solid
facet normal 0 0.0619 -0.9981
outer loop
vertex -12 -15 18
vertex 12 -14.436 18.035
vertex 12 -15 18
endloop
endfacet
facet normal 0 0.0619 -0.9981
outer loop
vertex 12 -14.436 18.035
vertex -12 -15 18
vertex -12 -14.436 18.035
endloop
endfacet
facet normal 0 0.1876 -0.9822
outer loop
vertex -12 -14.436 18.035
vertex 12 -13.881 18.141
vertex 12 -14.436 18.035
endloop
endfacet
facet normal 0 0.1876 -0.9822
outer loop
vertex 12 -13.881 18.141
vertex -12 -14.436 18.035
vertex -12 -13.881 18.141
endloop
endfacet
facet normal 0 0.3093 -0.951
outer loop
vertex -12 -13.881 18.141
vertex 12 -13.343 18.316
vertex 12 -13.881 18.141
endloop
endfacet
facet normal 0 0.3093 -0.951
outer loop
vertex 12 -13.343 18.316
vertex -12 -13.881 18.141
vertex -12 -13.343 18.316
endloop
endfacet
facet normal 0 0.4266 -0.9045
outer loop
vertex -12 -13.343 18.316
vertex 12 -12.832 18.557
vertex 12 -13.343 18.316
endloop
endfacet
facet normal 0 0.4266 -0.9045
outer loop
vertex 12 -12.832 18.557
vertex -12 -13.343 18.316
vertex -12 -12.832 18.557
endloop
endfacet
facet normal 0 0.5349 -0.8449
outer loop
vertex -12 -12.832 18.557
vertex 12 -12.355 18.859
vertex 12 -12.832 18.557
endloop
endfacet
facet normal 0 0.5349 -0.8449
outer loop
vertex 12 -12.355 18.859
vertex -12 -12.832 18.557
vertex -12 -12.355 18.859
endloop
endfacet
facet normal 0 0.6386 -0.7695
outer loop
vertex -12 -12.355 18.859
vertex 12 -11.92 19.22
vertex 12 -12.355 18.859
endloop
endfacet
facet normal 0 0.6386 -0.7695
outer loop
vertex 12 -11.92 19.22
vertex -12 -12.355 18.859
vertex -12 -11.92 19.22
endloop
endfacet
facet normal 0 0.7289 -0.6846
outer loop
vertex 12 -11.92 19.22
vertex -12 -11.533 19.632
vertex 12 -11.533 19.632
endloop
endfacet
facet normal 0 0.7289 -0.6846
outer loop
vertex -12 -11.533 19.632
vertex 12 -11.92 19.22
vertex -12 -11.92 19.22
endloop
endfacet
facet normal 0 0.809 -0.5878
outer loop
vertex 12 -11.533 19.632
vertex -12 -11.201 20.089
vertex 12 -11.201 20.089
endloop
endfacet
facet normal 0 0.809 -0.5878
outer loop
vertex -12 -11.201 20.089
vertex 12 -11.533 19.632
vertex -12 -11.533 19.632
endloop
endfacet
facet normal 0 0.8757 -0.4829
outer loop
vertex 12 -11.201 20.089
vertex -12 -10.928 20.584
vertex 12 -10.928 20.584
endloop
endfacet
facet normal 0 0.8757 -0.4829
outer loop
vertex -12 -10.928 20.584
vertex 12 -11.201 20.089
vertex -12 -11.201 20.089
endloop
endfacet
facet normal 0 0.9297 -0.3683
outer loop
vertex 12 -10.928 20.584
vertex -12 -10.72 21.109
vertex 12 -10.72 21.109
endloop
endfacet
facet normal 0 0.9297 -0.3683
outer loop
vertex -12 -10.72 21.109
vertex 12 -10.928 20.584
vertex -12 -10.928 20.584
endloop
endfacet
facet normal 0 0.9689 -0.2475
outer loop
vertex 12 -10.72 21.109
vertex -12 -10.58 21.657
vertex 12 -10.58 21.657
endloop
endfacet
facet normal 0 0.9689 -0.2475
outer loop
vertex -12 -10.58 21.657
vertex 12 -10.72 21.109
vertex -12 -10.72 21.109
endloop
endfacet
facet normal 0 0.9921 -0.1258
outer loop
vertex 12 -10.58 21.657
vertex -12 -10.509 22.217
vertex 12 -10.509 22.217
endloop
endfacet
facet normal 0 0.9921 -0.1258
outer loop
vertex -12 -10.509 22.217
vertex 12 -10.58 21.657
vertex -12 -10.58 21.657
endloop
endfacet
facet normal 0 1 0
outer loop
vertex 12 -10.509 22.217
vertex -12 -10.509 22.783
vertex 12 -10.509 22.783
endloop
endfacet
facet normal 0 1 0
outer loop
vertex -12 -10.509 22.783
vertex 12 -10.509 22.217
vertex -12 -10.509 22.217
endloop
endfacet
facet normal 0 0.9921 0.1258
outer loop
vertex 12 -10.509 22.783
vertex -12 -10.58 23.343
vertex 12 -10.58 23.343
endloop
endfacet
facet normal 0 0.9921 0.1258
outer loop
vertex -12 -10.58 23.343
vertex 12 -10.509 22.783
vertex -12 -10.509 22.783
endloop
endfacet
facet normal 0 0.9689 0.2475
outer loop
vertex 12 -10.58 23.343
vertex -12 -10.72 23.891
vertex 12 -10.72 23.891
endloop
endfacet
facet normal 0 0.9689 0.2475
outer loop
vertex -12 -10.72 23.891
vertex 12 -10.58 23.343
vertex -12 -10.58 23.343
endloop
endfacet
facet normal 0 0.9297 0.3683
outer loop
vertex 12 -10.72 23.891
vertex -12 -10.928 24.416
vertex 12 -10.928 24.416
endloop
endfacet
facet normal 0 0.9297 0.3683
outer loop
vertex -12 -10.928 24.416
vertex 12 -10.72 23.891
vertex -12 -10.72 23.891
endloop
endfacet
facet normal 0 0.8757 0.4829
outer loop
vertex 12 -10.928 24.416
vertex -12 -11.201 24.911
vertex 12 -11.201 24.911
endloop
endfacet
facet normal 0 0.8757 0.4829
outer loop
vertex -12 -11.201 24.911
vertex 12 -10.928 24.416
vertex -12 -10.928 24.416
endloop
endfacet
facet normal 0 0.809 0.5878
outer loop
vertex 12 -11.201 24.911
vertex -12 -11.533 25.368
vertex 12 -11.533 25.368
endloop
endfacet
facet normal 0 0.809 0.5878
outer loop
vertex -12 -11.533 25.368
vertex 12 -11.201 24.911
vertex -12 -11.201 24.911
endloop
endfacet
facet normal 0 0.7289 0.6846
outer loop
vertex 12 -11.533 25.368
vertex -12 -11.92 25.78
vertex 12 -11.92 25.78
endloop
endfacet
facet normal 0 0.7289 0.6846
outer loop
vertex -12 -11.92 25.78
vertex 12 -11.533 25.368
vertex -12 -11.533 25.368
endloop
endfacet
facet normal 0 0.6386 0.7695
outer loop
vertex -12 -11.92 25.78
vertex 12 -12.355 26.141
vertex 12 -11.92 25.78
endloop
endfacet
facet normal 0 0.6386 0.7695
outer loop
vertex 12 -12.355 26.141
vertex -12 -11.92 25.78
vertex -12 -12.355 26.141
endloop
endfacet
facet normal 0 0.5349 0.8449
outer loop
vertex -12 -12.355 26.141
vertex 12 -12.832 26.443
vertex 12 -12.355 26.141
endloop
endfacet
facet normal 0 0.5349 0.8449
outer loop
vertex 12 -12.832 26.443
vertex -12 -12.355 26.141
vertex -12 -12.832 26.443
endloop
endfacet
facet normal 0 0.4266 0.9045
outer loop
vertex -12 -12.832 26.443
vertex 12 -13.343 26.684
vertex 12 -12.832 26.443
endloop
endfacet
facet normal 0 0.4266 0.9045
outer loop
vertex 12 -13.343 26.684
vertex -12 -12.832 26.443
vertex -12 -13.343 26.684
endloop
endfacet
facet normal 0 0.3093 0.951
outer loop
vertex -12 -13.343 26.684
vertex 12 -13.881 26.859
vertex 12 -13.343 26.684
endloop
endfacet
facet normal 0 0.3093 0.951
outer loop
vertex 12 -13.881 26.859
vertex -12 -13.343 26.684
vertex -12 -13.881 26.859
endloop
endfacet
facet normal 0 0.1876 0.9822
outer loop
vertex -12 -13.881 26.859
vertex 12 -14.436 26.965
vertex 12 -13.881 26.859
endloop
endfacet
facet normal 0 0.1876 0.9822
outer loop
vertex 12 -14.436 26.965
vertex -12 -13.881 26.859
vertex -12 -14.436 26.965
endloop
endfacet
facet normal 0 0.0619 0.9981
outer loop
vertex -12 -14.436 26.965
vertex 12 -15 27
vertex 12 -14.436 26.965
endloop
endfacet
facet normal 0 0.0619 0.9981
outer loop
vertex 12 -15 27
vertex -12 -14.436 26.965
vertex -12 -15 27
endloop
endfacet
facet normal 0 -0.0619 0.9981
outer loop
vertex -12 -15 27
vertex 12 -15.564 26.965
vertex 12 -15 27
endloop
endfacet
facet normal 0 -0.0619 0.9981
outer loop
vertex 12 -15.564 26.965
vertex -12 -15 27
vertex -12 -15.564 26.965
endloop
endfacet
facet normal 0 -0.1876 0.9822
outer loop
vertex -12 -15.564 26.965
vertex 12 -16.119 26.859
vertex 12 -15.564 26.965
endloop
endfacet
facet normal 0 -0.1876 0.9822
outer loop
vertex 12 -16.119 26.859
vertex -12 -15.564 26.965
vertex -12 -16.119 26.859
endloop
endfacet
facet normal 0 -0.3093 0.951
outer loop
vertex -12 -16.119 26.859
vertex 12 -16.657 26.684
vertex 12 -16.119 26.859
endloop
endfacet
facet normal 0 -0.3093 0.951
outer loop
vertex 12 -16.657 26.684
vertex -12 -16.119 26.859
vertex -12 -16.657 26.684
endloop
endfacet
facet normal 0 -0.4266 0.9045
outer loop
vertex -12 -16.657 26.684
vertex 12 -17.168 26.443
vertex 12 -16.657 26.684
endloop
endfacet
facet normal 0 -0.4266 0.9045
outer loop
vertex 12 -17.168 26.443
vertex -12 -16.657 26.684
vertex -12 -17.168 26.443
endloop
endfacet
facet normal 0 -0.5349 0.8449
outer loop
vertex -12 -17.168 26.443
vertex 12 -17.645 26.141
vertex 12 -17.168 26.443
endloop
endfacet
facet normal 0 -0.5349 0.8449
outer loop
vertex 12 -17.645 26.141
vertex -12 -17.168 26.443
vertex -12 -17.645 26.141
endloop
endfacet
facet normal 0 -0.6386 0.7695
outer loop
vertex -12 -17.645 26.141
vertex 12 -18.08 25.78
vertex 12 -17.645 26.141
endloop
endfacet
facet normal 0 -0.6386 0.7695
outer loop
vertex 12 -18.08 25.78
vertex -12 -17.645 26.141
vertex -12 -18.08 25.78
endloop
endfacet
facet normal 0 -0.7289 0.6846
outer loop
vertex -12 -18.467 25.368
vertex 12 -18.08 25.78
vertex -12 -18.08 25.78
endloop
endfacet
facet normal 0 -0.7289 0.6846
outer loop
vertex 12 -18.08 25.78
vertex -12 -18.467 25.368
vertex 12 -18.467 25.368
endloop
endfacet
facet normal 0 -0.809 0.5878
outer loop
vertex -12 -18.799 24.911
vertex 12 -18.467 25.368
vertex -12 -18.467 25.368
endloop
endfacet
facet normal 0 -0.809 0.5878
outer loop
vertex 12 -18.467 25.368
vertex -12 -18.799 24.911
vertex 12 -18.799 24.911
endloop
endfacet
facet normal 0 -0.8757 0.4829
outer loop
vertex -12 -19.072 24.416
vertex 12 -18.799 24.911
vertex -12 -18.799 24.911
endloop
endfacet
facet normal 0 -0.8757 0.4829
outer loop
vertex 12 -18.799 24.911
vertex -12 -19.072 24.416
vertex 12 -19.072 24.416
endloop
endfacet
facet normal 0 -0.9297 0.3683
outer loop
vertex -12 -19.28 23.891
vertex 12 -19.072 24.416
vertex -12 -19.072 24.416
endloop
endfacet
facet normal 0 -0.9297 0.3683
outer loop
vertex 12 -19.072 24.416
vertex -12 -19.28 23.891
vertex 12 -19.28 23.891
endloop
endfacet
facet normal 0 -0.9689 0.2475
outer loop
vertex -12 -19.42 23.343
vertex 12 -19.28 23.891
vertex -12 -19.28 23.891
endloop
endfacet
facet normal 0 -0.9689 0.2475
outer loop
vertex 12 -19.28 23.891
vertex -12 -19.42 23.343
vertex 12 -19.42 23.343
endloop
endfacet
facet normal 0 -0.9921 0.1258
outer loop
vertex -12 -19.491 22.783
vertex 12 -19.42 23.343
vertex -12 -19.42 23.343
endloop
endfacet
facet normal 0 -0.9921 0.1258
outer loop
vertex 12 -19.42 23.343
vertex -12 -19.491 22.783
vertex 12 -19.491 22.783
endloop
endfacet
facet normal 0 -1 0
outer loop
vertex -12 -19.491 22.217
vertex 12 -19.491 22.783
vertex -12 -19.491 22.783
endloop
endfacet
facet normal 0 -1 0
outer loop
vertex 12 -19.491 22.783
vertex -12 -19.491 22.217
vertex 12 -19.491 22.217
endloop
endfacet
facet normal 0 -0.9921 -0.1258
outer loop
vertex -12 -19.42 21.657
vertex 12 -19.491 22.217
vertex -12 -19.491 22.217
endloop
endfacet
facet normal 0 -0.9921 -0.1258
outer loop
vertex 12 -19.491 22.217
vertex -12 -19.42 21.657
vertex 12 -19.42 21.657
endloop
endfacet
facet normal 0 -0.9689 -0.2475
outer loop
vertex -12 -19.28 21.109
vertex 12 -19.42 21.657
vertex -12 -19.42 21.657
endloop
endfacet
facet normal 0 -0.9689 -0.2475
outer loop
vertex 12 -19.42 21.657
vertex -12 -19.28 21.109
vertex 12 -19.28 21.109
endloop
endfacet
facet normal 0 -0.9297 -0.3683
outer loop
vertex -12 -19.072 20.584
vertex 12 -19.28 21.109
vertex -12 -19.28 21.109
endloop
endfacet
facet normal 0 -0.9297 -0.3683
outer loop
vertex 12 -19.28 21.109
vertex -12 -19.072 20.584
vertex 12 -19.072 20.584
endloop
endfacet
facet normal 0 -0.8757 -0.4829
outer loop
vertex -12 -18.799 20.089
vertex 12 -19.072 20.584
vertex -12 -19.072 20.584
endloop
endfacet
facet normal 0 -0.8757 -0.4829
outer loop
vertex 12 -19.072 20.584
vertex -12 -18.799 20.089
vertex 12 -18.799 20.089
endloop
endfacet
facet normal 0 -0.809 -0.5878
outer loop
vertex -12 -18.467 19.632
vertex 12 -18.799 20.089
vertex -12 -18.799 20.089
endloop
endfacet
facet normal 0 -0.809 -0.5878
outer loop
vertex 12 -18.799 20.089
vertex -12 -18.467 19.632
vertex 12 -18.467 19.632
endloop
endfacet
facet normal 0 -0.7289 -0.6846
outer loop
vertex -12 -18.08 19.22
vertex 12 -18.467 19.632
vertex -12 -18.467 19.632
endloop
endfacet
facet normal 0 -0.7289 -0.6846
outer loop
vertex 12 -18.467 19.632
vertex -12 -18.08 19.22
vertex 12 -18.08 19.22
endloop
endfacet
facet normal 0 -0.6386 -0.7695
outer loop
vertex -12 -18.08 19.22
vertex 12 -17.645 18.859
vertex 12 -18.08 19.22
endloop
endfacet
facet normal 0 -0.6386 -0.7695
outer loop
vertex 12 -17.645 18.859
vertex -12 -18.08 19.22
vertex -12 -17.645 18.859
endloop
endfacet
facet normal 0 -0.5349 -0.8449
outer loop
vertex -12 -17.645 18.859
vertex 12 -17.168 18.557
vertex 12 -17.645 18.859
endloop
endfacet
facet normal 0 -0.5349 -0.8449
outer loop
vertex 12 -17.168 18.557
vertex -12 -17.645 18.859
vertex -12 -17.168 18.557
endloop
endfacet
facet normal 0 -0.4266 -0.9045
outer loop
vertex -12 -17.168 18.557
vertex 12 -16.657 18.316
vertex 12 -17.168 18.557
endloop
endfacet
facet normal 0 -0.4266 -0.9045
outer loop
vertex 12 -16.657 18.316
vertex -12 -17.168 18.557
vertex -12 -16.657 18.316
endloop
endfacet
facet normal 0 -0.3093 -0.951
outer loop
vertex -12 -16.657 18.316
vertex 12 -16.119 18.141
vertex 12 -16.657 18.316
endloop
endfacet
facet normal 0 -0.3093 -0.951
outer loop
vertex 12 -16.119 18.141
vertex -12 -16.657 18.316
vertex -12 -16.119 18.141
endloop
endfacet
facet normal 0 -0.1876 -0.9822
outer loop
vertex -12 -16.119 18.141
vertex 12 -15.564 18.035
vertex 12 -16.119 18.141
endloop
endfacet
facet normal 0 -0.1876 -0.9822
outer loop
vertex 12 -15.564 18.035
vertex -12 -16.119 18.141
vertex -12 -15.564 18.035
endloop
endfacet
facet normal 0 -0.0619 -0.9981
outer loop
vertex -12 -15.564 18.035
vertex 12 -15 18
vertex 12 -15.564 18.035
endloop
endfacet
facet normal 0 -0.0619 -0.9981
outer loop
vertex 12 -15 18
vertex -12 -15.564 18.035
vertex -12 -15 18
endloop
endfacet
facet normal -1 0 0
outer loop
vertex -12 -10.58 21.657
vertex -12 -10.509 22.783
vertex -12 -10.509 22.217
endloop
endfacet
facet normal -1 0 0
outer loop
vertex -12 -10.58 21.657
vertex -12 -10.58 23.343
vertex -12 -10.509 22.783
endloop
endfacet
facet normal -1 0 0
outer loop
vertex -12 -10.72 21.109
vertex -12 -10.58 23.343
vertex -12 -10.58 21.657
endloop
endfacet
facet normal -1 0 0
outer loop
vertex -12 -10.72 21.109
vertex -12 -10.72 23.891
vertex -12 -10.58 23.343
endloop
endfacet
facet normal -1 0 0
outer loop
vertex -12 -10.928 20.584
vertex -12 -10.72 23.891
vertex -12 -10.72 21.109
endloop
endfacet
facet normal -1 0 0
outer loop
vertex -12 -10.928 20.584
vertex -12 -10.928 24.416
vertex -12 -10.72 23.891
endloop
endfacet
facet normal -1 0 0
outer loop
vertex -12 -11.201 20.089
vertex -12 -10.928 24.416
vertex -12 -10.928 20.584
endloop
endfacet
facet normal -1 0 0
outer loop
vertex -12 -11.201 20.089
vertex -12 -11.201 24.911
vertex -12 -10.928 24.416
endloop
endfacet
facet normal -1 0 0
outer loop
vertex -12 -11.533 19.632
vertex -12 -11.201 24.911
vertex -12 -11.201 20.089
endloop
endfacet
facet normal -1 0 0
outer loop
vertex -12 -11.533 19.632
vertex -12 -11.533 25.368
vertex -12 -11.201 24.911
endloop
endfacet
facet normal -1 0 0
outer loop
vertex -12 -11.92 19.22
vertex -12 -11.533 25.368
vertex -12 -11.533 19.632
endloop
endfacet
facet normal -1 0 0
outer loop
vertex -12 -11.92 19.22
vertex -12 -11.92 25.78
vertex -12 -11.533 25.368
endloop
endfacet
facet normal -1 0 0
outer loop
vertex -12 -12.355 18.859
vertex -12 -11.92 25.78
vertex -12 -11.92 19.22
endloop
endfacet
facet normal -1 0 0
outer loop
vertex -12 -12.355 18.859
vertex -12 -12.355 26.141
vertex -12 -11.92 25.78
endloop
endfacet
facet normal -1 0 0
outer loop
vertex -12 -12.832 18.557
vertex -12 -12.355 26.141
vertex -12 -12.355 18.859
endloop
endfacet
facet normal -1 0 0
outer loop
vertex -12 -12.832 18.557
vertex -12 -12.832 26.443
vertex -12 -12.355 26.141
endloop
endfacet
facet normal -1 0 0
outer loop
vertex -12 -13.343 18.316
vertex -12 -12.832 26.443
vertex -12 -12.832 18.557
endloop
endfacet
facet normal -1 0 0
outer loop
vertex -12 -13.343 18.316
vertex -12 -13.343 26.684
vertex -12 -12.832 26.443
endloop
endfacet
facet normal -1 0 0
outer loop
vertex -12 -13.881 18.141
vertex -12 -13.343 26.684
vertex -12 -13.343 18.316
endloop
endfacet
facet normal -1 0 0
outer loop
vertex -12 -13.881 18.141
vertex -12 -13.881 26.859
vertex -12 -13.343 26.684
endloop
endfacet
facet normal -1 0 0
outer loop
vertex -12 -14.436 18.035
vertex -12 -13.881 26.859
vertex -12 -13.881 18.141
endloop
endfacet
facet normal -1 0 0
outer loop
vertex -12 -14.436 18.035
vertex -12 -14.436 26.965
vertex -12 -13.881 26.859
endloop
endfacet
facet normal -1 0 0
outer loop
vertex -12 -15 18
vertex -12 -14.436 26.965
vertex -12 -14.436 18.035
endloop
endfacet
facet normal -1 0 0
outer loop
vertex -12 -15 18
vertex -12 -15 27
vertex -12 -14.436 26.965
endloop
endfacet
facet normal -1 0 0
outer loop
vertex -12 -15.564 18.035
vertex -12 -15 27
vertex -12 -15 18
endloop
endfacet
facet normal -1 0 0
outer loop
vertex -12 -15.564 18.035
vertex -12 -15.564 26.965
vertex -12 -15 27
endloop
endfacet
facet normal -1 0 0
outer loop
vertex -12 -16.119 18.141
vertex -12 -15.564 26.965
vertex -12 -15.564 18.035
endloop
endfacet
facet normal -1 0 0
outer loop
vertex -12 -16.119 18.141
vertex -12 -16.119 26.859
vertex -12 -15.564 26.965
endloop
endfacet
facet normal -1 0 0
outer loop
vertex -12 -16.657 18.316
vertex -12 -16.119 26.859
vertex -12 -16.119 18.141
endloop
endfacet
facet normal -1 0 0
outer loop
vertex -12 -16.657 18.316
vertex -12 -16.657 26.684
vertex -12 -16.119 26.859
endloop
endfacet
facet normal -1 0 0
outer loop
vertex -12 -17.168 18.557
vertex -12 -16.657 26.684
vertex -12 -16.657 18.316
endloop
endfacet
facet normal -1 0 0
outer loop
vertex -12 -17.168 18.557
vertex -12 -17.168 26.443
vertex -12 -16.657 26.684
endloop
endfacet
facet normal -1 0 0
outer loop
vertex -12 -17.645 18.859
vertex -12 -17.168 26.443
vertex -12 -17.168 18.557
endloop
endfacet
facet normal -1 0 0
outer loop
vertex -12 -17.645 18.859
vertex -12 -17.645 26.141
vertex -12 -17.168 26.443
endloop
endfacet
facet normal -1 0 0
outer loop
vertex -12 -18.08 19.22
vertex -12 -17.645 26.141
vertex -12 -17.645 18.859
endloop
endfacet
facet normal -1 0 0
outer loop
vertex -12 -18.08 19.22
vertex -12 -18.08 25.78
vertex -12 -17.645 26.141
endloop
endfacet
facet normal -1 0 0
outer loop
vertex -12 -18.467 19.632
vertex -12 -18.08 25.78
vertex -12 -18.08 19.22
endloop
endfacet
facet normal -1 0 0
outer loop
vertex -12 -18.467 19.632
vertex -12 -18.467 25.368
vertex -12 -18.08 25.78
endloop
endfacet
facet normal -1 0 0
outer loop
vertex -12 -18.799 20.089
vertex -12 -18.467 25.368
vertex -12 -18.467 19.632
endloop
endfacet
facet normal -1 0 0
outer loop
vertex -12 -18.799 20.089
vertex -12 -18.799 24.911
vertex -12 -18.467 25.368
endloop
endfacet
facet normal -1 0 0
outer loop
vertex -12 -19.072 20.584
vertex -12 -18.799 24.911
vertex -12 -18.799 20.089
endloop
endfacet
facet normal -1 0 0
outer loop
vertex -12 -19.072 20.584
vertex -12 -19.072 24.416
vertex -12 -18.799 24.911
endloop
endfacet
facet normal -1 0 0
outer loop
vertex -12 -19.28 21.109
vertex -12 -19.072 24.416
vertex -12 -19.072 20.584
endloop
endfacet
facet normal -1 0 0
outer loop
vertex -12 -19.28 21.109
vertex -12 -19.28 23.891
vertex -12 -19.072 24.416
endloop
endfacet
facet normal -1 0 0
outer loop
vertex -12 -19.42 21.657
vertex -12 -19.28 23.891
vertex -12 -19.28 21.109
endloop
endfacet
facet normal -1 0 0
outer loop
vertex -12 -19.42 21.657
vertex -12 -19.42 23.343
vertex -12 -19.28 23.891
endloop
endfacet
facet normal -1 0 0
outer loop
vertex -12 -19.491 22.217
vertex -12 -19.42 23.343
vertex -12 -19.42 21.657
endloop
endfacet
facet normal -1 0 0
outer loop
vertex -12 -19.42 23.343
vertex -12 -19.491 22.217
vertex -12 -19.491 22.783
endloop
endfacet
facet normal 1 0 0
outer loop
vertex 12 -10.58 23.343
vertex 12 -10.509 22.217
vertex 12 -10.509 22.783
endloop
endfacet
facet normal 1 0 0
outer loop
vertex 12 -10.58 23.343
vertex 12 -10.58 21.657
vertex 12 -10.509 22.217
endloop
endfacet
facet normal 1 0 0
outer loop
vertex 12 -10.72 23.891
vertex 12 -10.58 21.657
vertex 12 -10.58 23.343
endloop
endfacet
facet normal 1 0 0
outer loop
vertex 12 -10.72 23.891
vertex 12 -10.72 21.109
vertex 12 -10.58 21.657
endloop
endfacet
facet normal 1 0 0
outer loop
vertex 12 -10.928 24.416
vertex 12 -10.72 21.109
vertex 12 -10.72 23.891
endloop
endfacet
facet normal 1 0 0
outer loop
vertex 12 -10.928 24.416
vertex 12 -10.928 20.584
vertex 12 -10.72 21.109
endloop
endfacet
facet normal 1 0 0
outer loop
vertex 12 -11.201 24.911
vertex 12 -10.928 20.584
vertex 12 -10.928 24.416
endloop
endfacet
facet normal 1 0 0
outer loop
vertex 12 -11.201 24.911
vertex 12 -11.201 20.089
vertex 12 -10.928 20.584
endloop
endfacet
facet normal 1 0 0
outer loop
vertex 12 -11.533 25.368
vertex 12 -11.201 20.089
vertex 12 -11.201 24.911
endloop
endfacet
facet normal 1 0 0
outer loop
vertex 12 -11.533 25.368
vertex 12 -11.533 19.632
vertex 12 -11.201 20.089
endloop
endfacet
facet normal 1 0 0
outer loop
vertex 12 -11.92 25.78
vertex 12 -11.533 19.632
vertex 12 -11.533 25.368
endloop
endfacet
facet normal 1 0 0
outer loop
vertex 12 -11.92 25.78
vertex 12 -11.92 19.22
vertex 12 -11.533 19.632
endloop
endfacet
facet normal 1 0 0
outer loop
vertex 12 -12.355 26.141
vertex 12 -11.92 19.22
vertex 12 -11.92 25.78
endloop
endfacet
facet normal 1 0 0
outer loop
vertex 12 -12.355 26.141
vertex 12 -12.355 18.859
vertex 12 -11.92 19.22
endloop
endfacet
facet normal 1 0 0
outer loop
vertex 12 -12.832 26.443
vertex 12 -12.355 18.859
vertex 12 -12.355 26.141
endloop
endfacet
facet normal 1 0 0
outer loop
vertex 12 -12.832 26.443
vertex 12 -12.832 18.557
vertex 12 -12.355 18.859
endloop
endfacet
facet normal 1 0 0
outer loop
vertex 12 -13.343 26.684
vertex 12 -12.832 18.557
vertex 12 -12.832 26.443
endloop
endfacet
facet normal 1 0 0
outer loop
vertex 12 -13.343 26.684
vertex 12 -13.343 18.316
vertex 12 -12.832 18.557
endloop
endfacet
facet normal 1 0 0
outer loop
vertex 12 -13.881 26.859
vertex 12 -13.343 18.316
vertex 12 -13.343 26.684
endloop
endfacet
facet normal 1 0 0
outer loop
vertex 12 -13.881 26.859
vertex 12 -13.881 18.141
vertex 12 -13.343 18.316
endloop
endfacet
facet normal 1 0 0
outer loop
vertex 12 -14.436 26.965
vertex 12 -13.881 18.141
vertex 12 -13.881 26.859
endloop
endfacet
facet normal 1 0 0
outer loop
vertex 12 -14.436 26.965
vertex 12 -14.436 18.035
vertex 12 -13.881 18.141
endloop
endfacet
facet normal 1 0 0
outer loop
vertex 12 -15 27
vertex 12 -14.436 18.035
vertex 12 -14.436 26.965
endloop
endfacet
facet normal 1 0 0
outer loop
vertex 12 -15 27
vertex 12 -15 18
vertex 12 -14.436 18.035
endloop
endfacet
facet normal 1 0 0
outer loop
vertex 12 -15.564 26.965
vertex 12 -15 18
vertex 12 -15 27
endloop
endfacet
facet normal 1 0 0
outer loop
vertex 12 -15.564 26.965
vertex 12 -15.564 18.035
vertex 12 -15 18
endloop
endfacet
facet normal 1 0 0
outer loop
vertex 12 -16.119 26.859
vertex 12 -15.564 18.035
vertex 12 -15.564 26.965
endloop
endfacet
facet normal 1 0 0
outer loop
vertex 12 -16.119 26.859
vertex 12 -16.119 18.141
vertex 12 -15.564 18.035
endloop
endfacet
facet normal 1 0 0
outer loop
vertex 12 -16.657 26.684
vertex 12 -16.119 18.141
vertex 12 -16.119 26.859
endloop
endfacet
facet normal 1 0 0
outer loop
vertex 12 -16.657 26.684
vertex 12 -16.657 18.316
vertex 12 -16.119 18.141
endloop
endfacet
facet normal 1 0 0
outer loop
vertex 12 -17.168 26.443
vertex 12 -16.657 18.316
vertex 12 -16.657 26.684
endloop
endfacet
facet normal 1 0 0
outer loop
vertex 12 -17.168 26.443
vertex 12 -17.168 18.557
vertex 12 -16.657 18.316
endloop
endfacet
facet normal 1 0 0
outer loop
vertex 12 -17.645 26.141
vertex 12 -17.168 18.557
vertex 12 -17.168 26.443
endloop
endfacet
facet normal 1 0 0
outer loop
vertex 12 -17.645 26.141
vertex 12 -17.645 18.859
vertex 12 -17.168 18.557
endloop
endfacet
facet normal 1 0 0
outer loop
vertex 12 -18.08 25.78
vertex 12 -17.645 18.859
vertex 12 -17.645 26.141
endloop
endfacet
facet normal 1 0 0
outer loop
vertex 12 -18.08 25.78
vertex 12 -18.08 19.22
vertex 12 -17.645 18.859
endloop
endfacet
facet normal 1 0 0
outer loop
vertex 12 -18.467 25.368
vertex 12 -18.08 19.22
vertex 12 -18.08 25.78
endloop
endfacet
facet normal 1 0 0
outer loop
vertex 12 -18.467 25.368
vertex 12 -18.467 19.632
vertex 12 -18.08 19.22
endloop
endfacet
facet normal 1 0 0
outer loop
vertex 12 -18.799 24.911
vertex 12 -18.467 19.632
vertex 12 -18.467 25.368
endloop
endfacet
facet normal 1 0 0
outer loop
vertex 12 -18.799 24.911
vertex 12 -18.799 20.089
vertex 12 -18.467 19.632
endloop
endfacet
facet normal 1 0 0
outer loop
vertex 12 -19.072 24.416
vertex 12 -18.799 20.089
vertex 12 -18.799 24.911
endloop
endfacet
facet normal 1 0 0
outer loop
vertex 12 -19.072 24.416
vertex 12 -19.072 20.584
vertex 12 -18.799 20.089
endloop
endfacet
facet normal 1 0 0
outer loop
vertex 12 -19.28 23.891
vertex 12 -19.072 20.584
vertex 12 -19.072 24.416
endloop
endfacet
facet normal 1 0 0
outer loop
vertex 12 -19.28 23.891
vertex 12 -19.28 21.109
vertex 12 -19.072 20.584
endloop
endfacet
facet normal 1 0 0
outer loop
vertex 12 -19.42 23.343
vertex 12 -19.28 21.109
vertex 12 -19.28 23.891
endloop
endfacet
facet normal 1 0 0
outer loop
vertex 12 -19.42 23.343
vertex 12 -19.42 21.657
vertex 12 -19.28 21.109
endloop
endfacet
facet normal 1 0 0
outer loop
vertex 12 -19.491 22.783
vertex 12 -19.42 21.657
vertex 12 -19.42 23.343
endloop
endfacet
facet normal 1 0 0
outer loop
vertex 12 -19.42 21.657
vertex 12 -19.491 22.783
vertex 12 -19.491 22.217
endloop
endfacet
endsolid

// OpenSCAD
$fn=50;

d_bottle = 25.3;
size = 0.5;

module oiladdin() {
	difference() {
		union() {
			translate([0, 0, -20]) cylinder(
				h=50,
				d1=d_bottle * 0.9,
				d2=d_bottle,
				center=true
			);
			scale(size) translate([-47.5, 115.5, 0]) import("LAMP_filled.stl");
		}
		scale(size) union() {
			translate([0, 0, 61]) rotate([78, 0, 0]) cylinder(r=4, h=190);
			translate([0, -15, 82]) rotate([0, 90, 0]) cylinder(d=20, h=50, center=true);
			translate([0,  30, 55]) rotate([0, 90, 0]) cylinder(d=20, h=50, center=true);
			translate([0, -30, 45]) rotate([0, 90, 0]) cylinder(d=20, h=50, center=true);
			translate([0, 0, -170]) cylinder(r=5, h=235);
		}
	}
}

// intersection() {
// 	oiladdin();
	// translate([350, 0, 0]) cube(size=[700, 700, 700], center=true);  	// left side
	// translate([-350, 0, 0]) cube(size=[700, 700, 700], center=true);		// right side
// }

// pin (need 3)
scale(size) translate([0, -30, 45]) rotate([0, 90, 0]) cylinder(h=48, d=18, center=true);
